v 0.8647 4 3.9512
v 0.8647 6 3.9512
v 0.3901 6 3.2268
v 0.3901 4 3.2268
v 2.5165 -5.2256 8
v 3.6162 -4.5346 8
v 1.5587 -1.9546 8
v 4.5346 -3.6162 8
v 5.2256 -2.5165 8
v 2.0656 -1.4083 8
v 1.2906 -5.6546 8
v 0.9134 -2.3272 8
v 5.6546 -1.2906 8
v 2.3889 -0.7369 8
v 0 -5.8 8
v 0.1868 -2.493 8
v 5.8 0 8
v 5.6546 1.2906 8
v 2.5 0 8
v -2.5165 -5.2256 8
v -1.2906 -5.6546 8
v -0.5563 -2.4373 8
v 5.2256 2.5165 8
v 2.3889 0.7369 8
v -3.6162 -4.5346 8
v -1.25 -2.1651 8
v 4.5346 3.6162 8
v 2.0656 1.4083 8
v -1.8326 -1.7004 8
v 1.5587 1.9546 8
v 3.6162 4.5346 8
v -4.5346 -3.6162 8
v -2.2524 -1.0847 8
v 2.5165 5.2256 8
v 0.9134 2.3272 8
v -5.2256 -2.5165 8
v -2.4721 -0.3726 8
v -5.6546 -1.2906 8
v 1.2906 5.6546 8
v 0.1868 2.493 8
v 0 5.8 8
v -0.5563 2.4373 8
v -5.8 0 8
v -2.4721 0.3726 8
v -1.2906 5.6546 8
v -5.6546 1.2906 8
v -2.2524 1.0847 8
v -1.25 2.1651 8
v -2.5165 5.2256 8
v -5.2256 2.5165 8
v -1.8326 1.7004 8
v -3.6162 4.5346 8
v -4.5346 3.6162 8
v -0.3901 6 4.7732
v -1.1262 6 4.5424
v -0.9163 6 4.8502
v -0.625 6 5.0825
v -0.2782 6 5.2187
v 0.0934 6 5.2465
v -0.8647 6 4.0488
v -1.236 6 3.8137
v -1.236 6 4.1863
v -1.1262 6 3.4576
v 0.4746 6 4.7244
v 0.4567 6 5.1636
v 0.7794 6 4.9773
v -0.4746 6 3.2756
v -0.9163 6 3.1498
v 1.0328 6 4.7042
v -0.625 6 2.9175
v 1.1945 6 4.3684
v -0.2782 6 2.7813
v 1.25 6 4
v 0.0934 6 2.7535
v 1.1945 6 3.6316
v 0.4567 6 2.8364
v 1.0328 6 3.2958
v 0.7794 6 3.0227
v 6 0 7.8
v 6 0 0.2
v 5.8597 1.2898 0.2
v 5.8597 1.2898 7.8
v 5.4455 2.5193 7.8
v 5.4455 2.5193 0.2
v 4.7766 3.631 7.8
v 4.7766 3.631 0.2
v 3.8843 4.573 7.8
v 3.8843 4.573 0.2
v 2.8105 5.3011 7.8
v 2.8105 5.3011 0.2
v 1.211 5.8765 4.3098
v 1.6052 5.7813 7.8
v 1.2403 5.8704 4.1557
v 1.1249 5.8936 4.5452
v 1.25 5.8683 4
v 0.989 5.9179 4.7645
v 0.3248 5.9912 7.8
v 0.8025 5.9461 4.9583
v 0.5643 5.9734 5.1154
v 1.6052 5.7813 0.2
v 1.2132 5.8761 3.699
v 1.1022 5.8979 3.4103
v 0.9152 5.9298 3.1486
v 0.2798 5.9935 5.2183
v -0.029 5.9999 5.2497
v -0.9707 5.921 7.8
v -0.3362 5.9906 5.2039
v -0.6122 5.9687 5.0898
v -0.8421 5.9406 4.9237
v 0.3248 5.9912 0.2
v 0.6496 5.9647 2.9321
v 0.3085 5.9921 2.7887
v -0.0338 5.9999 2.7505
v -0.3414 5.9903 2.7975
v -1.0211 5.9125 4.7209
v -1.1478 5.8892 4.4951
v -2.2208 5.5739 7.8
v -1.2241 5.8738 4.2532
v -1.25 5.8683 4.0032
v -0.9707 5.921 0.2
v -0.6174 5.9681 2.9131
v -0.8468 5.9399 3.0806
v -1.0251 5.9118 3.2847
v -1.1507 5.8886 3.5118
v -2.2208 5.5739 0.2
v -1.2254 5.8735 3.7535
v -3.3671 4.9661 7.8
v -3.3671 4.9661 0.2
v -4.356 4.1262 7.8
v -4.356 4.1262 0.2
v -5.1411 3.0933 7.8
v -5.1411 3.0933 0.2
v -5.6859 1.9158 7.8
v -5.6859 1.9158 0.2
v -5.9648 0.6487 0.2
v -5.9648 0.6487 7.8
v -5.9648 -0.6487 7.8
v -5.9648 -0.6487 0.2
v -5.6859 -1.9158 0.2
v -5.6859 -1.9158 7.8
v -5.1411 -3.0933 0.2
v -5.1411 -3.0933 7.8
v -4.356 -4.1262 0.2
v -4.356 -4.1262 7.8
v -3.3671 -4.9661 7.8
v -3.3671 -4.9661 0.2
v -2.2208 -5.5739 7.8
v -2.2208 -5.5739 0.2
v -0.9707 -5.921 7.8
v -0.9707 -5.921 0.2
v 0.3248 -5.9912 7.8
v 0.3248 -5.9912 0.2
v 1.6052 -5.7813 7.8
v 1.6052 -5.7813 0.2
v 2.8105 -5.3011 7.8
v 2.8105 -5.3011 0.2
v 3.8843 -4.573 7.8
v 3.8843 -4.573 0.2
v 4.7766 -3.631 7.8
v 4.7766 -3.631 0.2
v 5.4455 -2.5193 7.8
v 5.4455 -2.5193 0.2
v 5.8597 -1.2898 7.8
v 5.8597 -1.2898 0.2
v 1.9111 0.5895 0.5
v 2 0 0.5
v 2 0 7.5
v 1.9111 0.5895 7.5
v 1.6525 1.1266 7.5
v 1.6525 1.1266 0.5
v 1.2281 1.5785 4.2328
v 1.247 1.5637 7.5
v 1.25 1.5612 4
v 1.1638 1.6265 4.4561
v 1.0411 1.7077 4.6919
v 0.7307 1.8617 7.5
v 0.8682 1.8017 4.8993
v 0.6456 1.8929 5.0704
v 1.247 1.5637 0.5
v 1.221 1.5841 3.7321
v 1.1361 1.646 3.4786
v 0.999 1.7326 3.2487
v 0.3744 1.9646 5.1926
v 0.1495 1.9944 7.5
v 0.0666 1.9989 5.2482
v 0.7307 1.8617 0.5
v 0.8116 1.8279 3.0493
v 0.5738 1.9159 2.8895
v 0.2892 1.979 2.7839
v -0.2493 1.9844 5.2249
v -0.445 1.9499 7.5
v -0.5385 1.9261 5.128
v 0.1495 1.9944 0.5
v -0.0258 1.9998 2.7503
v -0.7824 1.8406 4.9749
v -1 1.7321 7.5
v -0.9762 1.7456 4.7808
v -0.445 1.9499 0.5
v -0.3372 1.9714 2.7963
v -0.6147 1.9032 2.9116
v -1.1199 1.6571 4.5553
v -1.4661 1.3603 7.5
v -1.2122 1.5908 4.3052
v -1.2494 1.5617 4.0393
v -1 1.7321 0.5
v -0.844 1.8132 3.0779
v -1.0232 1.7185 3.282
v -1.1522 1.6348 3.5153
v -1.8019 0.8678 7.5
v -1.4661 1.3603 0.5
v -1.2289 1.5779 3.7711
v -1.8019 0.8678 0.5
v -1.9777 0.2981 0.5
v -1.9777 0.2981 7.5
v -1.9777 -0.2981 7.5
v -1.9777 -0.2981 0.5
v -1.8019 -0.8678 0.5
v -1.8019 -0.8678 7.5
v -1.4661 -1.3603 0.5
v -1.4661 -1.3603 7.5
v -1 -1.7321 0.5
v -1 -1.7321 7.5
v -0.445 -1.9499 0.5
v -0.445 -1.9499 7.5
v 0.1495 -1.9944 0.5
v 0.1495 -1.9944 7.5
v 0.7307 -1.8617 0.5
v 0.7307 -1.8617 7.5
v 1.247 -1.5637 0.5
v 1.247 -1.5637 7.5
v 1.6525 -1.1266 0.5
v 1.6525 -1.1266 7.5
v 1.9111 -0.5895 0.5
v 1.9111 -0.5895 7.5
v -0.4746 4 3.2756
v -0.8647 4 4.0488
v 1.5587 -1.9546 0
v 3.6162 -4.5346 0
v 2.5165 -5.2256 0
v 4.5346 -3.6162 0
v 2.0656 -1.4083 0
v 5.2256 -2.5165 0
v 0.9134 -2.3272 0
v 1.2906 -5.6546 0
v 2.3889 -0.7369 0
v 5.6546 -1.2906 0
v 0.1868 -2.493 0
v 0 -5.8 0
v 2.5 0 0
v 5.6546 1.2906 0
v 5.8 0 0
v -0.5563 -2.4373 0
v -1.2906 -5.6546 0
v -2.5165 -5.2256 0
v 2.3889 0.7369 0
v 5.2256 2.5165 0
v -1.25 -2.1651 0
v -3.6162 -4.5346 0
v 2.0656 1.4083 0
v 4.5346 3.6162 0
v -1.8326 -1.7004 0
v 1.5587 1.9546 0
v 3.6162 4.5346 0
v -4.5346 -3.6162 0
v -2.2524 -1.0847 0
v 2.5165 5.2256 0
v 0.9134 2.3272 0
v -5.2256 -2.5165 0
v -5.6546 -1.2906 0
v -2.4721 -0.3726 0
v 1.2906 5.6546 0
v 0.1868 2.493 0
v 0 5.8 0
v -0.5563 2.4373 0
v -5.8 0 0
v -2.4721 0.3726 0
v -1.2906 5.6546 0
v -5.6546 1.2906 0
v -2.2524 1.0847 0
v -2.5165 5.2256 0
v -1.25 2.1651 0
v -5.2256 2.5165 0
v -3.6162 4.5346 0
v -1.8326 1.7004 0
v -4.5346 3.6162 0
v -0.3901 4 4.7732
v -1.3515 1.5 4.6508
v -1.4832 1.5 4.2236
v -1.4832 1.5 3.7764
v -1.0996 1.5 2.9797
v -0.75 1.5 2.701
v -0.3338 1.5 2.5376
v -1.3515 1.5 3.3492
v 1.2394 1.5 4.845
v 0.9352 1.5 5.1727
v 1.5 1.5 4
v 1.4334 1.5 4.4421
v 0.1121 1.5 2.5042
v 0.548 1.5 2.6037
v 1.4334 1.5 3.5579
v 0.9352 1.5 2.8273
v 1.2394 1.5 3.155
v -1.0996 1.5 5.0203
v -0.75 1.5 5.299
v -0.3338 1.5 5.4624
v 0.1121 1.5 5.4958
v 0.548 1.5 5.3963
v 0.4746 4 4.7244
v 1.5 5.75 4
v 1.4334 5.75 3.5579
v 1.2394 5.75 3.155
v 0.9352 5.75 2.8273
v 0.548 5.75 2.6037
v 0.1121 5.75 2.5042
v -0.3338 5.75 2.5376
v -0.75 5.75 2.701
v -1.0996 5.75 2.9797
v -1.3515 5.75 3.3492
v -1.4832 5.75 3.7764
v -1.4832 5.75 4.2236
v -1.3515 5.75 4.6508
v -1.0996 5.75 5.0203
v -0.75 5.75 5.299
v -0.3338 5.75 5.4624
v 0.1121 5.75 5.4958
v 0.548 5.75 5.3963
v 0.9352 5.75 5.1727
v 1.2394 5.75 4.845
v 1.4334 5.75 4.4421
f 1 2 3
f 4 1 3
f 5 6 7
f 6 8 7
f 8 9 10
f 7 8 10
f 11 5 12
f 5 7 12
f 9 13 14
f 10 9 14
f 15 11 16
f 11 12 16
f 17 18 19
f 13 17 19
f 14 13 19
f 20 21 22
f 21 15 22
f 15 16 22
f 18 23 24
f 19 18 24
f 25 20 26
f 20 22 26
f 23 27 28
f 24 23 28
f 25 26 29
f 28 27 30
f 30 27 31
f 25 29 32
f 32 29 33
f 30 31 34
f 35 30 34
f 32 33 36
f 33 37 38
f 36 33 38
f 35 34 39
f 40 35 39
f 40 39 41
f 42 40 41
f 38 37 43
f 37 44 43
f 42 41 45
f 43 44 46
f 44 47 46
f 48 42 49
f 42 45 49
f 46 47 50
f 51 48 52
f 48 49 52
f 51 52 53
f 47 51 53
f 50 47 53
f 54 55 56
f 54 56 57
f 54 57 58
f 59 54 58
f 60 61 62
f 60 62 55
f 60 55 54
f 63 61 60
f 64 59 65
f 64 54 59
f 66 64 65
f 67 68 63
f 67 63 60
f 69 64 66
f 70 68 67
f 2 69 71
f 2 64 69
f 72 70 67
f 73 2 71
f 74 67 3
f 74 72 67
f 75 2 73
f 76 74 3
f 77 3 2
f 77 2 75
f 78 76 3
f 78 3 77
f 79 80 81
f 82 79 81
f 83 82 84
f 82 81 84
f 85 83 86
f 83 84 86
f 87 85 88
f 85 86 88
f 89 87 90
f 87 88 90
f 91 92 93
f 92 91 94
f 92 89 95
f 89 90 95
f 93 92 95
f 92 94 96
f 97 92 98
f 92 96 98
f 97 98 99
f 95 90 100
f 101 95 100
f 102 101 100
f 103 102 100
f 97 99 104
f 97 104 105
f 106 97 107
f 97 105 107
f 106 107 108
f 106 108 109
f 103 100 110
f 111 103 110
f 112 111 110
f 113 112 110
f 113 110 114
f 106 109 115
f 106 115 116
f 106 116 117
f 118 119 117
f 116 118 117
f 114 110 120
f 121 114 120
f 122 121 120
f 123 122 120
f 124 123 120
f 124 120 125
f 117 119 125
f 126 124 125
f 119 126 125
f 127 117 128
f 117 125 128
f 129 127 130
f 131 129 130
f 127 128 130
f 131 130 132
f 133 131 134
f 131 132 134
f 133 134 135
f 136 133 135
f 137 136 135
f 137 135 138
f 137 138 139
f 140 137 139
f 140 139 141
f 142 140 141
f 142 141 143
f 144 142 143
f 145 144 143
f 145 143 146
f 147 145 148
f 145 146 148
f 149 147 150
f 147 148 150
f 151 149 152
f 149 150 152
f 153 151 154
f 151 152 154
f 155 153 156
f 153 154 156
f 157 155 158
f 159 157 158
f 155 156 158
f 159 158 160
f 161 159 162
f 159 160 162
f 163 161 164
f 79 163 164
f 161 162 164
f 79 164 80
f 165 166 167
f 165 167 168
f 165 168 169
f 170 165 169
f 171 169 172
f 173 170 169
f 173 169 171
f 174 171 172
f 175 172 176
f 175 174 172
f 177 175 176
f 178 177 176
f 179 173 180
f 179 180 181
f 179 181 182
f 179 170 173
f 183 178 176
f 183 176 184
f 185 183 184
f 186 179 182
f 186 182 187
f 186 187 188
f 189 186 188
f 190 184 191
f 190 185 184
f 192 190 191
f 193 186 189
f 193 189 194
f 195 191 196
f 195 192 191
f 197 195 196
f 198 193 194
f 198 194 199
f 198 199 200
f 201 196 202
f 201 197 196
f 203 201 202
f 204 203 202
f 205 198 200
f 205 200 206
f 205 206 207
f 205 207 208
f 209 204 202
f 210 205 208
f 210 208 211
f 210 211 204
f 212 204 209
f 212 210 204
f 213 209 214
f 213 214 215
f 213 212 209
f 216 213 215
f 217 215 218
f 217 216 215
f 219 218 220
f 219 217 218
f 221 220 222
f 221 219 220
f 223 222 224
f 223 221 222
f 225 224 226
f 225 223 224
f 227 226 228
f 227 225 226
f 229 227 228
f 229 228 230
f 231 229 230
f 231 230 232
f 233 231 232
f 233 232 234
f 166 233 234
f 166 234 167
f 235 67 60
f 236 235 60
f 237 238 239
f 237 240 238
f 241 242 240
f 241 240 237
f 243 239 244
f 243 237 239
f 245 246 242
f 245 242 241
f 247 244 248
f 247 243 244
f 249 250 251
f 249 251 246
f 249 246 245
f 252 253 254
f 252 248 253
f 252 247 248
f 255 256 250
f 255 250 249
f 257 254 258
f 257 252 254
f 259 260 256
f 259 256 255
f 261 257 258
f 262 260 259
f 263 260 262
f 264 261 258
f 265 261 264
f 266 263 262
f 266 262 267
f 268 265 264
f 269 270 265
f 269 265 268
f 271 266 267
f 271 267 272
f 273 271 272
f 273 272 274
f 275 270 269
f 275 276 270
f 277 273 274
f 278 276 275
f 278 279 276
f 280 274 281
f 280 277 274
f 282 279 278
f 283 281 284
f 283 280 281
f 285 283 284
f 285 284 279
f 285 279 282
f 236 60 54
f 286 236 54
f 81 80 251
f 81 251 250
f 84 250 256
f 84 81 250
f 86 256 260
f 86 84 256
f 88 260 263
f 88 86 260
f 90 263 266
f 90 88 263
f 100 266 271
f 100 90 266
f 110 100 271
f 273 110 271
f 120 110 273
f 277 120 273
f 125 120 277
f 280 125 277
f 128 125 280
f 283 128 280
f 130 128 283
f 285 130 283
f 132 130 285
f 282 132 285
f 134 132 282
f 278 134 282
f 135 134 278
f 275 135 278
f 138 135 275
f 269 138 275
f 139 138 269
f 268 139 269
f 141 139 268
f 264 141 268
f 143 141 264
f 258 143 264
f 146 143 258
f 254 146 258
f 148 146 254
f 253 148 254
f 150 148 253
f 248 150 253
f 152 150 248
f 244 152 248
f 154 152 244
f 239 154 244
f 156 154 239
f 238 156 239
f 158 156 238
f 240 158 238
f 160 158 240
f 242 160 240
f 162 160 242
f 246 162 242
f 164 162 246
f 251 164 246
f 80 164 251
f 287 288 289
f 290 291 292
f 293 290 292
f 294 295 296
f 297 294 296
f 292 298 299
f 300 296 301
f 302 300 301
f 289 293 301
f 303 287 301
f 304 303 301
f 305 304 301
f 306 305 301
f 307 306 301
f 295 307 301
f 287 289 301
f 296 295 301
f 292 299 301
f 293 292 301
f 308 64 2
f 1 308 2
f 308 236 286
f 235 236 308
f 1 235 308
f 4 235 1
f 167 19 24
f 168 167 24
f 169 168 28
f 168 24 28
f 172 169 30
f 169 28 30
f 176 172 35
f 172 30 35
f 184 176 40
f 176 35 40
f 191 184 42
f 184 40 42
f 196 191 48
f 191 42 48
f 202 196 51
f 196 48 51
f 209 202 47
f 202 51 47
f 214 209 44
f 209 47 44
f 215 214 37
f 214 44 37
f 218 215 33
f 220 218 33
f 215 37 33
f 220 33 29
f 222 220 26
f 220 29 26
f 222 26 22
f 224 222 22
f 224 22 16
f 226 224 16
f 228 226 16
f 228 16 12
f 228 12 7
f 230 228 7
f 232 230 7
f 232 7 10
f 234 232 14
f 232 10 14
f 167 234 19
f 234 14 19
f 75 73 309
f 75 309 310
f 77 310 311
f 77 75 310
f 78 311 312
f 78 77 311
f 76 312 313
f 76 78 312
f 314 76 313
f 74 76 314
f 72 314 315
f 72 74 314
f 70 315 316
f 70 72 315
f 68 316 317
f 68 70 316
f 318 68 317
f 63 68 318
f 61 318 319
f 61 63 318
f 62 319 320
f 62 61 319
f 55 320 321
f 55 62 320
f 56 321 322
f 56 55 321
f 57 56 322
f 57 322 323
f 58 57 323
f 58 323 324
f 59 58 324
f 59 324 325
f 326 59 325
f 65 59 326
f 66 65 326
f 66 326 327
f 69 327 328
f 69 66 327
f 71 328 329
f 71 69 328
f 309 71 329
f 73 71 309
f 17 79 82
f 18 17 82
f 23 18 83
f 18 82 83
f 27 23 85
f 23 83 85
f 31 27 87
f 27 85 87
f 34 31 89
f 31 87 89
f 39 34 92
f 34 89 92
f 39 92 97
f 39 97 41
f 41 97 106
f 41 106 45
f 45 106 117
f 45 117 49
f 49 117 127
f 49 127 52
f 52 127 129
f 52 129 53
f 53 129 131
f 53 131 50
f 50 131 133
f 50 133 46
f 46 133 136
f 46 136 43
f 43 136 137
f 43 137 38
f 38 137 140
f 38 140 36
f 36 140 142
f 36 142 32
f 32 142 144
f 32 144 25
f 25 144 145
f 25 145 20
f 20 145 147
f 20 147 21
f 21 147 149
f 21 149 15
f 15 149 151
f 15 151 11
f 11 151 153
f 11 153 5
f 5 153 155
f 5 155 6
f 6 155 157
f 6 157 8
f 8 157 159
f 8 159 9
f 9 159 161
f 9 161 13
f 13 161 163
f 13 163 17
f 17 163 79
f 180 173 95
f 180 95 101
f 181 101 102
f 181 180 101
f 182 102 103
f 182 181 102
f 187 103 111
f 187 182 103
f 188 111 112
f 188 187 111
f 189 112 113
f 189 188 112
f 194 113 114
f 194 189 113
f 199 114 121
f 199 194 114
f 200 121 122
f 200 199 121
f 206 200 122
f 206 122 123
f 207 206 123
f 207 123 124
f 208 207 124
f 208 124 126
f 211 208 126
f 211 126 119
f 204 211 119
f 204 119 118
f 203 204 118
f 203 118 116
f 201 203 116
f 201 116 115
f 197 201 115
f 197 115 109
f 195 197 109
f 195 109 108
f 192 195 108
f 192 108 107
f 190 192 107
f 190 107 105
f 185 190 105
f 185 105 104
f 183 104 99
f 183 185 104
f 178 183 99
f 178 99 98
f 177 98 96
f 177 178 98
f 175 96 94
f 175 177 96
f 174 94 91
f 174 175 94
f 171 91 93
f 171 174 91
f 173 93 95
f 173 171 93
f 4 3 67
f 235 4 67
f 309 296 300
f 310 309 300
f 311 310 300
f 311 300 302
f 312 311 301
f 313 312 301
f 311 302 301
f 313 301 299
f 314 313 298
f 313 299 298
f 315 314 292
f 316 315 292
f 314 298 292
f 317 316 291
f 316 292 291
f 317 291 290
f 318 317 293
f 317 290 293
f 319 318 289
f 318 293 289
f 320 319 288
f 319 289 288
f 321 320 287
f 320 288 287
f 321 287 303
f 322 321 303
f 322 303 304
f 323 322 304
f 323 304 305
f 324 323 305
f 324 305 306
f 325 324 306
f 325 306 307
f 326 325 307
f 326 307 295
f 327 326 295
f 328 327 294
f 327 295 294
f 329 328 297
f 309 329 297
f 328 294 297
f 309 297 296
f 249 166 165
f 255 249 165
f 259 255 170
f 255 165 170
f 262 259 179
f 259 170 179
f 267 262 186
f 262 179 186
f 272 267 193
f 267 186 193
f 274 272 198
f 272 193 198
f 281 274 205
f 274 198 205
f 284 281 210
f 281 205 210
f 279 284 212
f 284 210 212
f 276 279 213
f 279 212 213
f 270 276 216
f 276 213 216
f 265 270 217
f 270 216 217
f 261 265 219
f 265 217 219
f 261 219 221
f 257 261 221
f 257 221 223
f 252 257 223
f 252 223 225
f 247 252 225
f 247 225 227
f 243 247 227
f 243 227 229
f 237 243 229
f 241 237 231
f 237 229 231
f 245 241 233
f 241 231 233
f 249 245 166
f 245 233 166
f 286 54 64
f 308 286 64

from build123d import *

# Parameters (mm, degrees)
SKETCH1_W           = 4
SKETCH1_H           = 8
SKETCH2_R           = 1.25
CUT_EXTRUDE1_DEPTH  = 7
CHAMFER1_SIZE       = 0.2
SKETCH4_R           = 1.5
BOSS_EXTRUDE1_DEPTH = 4.5
CHAMFER2_SIZE       = 0.25
CUT_EXTRUDE3_DEPTH  = 2
CHAMFER3_SIZE       = 0.5


with BuildPart() as part:
    # Sketch1 → Revolve1 (revolve)
    with BuildSketch(Plane(origin=(0, 0, 0), x_dir=(1, 0, 0), z_dir=(0, 1, 0))):
        with Locations((4, -4)):
            Rectangle(SKETCH1_W, SKETCH1_H)
    revolve(axis=Axis((0, 0, -122.457916377), (0, 0, 1)))

    # Sketch2 → Cut-Extrude1 (cut, through all)
    with BuildSketch(Plane(origin=(0, 0, 0), x_dir=(1, 0, 0), z_dir=(0, 1, 0))):
        with Locations((0, -4)):
            Circle(SKETCH2_R)
    extrude(amount=CUT_EXTRUDE1_DEPTH, mode=Mode.SUBTRACT)

    # Chamfer1
    chamfer1_edges = [part.edges().sort_by_distance(p)[0] for p in [
        (-6, 0, 0),
        (-6, 0, 8),
    ]]
    chamfer(chamfer1_edges, length=CHAMFER1_SIZE)

    # Chamfer3
    chamfer3_edges = [part.edges().sort_by_distance(p)[0] for p in [
        (-2, 0, 8),
        (-2, 0, 0),
    ]]
    chamfer(chamfer3_edges, length=CHAMFER3_SIZE)


with BuildPart() as body_2:
    # Sketch4 → Boss-Extrude1 (new body)
    with BuildSketch(Plane(origin=(0, 1.5, 0), x_dir=(1, 0, 0), z_dir=(0, 1, 0))):
        with Locations((0, -4)):
            Circle(SKETCH4_R)
    extrude(amount=BOSS_EXTRUDE1_DEPTH)

    # Chamfer2
    chamfer2_edges = [body_2.edges().sort_by_distance(p)[0] for p in [
        (-1.5, 6, 4),
    ]]
    chamfer(chamfer2_edges, length=CHAMFER2_SIZE)

    # Sketch5 → Cut-Extrude3 (cut)
    with BuildSketch(Plane(origin=(0, 6, 0), x_dir=(1, 0, 0), z_dir=(0, 1, 0))):
        Polygon((0.4745541, -4.724429711), (0.864651583, -3.951238949), (0.390097483, -3.226809238), (-0.4745541, -3.275570289), (-0.864651583, -4.048761051), (-0.390097483, -4.773190762), align=None)
    extrude(amount=-CUT_EXTRUDE3_DEPTH, mode=Mode.SUBTRACT)


solid = Compound([part.part, body_2.part])
